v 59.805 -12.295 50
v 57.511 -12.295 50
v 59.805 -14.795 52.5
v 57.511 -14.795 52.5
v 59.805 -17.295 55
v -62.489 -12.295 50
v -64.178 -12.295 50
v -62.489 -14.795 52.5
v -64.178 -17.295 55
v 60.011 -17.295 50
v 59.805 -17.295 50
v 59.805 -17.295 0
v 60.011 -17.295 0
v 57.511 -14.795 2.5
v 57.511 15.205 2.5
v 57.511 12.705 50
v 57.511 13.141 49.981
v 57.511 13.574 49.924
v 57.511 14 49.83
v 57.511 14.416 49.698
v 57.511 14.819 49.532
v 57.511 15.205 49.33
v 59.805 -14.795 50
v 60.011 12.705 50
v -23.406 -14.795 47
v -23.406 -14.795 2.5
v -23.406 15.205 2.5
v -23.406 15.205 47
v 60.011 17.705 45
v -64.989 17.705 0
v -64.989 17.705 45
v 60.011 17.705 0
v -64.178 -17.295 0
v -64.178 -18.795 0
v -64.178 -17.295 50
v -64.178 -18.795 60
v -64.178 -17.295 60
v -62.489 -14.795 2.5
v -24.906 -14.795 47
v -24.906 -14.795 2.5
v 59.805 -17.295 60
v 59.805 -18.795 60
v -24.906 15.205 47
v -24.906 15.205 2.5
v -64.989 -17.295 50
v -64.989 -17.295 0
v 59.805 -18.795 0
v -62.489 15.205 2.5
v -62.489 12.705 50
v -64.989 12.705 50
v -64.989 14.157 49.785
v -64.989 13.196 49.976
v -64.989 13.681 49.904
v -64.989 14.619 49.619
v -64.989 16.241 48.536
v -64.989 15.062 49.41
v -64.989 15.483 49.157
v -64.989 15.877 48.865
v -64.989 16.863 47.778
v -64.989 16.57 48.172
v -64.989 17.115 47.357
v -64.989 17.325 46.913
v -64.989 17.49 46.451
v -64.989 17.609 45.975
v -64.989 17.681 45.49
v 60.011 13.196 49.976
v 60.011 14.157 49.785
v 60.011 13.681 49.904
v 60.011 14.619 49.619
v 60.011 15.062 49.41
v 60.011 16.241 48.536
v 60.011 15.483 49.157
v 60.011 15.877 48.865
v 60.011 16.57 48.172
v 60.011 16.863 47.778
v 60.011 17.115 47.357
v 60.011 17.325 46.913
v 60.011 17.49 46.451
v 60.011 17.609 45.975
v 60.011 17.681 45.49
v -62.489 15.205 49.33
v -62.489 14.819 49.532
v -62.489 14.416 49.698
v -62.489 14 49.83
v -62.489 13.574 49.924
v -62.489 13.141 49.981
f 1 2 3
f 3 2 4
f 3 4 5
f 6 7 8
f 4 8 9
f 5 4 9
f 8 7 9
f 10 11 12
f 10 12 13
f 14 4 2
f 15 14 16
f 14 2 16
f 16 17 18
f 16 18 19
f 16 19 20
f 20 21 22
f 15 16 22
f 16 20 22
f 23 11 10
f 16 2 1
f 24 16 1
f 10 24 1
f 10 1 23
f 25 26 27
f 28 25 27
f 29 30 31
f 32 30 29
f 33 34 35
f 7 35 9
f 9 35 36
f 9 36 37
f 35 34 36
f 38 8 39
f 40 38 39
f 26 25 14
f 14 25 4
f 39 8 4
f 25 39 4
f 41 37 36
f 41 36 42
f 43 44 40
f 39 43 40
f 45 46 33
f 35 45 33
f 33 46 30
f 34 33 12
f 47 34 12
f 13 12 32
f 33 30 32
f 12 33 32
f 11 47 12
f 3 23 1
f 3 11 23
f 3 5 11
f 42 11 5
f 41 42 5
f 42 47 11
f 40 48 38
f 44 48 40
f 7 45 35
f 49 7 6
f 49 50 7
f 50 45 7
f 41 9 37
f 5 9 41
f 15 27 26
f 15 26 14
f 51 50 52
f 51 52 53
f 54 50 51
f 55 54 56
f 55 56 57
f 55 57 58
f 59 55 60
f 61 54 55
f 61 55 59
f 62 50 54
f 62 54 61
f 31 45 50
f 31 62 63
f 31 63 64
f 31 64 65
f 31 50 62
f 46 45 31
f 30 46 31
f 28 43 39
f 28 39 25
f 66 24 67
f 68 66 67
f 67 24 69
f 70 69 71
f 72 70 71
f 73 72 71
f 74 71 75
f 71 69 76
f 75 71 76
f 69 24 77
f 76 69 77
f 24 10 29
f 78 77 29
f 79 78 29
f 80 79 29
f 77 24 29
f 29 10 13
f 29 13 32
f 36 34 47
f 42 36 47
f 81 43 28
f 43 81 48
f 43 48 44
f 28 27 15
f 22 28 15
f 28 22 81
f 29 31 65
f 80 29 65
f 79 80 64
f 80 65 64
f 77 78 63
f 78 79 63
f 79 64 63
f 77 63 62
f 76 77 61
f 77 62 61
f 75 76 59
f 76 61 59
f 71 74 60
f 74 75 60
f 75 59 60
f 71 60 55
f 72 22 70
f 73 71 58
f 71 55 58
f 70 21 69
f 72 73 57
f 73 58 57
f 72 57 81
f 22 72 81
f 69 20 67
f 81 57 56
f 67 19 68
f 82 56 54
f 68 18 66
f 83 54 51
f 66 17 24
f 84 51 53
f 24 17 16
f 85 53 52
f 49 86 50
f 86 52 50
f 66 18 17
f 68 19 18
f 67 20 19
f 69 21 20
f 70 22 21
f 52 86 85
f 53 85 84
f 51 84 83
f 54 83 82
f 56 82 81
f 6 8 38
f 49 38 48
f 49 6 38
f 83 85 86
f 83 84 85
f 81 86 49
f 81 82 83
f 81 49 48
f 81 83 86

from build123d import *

# Parameters (mm, degrees)
F0_W         = 125
F0_H         = 35
F1_DEPTH     = 50
F2_T         = -2.5
F3_T1_DEPTH  = 150
F5_DEPTH     = 47
F6_W         = 123.983182013
F6_H         = 1.5
F7_DEPTH     = 60
F8_T4_DEPTH  = 136.8415969529
F8_T9_DEPTH  = 123.983182013
F8_T14_DEPTH = 136.8415969529


# Not quite as in the source:
# - a fillet or chamfer that OpenCascade refuses, or shapes differently, is made with other operations: its cross-section is extruded or revolved along the edge and cut away or added


with BuildPart() as f1:
    # F0 (on Top) → F1 (new body)
    with BuildSketch(Plane.XY):
        with Locations((-2.4887919426, 0.2054322337)):
            Rectangle(F0_W, F0_H)
    extrude(amount=F1_DEPTH)

    # F2
    f2_openings = [f1.faces().sort_by_distance(p)[0] for p in [
        (-2.488792, 0.205432, 50),
    ]]
    offset(amount=F2_T, openings=f2_openings)

    # F3: fillet of radius 5 on 1 edges, made by hand

    # F3_s2 → F3_t1 (cut)
    with BuildSketch(Plane.YZ.offset(-77.4887919426)):
        with BuildLine():
            ThreePointArc((17.7054322337, 45), (16.2409661396, 48.5355339059), (12.7054322337, 50))
            Line((12.7054322337, 50), (17.7054322337, 50))
            Line((17.7054322337, 50), (17.7054322337, 45))
        make_face()
    extrude(amount=F3_T1_DEPTH, mode=Mode.SUBTRACT)

    # F4 (on Top) → F5 (join)
    with BuildSketch(Plane.XY):
        Polygon((-23.4062603042, 15.2347357944), (-24.9062603042, 15.2233950794), (-24.9062603042, -14.9235967547), (-23.4062603042, -14.9009153247), align=None)
    extrude(amount=F5_DEPTH)

    # F6 (on Top) → F7 (join)
    with BuildSketch(Plane.XY):
        with Locations((-2.1866001189, -18.0445677663)):
            Rectangle(F6_W, F6_H)
    extrude(amount=F7_DEPTH)

    # F8: chamfer of 5 on 1 edges, made by hand


with BuildPart() as f8_tool2:
    # F8_s3 → F8_t4 (new body)
    with BuildSketch(Plane.YZ.offset(-64.1781911254)):
        Polygon((-12.2945677663, 50), (-17.2945677663, 55), (-17.2945677663, 50), align=None)
    extrude(amount=F8_T4_DEPTH)

    split(bisect_by=Plane.YZ.offset(-62.4887919426), keep=Keep.BOTTOM)


with BuildPart() as f1_1:
    add(f1.part)

    # F8_t1: union F8_tool2
    add(f8_tool2.part)


with BuildPart() as f8_tool7:
    # F8_s8 → F8_t9 (new body)
    with BuildSketch(Plane.YZ.offset(-64.1781911254)):
        Polygon((-12.2945677663, 50), (-17.2945677663, 55), (-17.2945677663, 50), align=None)
    extrude(amount=F8_T9_DEPTH)

    split(bisect_by=Plane.XZ.offset(14.7945677663), keep=Keep.TOP)


with BuildPart() as f1_2:
    add(f1_1.part)

    # F8_t6: union F8_tool7
    add(f8_tool7.part)


with BuildPart() as f8_tool12:
    # F8_s13 → F8_t14 (new body)
    with BuildSketch(Plane.YZ.offset(-77.0366060652)):
        Polygon((-12.2945677663, 50), (-17.2945677663, 55), (-17.2945677663, 50), align=None)
    extrude(amount=F8_T14_DEPTH)

    split(bisect_by=Plane.YZ.offset(57.5112080574), keep=Keep.TOP)


with BuildPart() as f1_3:
    add(f1_2.part)

    # F8_t11: union F8_tool12
    add(f8_tool12.part)


solid = f1_3.part
